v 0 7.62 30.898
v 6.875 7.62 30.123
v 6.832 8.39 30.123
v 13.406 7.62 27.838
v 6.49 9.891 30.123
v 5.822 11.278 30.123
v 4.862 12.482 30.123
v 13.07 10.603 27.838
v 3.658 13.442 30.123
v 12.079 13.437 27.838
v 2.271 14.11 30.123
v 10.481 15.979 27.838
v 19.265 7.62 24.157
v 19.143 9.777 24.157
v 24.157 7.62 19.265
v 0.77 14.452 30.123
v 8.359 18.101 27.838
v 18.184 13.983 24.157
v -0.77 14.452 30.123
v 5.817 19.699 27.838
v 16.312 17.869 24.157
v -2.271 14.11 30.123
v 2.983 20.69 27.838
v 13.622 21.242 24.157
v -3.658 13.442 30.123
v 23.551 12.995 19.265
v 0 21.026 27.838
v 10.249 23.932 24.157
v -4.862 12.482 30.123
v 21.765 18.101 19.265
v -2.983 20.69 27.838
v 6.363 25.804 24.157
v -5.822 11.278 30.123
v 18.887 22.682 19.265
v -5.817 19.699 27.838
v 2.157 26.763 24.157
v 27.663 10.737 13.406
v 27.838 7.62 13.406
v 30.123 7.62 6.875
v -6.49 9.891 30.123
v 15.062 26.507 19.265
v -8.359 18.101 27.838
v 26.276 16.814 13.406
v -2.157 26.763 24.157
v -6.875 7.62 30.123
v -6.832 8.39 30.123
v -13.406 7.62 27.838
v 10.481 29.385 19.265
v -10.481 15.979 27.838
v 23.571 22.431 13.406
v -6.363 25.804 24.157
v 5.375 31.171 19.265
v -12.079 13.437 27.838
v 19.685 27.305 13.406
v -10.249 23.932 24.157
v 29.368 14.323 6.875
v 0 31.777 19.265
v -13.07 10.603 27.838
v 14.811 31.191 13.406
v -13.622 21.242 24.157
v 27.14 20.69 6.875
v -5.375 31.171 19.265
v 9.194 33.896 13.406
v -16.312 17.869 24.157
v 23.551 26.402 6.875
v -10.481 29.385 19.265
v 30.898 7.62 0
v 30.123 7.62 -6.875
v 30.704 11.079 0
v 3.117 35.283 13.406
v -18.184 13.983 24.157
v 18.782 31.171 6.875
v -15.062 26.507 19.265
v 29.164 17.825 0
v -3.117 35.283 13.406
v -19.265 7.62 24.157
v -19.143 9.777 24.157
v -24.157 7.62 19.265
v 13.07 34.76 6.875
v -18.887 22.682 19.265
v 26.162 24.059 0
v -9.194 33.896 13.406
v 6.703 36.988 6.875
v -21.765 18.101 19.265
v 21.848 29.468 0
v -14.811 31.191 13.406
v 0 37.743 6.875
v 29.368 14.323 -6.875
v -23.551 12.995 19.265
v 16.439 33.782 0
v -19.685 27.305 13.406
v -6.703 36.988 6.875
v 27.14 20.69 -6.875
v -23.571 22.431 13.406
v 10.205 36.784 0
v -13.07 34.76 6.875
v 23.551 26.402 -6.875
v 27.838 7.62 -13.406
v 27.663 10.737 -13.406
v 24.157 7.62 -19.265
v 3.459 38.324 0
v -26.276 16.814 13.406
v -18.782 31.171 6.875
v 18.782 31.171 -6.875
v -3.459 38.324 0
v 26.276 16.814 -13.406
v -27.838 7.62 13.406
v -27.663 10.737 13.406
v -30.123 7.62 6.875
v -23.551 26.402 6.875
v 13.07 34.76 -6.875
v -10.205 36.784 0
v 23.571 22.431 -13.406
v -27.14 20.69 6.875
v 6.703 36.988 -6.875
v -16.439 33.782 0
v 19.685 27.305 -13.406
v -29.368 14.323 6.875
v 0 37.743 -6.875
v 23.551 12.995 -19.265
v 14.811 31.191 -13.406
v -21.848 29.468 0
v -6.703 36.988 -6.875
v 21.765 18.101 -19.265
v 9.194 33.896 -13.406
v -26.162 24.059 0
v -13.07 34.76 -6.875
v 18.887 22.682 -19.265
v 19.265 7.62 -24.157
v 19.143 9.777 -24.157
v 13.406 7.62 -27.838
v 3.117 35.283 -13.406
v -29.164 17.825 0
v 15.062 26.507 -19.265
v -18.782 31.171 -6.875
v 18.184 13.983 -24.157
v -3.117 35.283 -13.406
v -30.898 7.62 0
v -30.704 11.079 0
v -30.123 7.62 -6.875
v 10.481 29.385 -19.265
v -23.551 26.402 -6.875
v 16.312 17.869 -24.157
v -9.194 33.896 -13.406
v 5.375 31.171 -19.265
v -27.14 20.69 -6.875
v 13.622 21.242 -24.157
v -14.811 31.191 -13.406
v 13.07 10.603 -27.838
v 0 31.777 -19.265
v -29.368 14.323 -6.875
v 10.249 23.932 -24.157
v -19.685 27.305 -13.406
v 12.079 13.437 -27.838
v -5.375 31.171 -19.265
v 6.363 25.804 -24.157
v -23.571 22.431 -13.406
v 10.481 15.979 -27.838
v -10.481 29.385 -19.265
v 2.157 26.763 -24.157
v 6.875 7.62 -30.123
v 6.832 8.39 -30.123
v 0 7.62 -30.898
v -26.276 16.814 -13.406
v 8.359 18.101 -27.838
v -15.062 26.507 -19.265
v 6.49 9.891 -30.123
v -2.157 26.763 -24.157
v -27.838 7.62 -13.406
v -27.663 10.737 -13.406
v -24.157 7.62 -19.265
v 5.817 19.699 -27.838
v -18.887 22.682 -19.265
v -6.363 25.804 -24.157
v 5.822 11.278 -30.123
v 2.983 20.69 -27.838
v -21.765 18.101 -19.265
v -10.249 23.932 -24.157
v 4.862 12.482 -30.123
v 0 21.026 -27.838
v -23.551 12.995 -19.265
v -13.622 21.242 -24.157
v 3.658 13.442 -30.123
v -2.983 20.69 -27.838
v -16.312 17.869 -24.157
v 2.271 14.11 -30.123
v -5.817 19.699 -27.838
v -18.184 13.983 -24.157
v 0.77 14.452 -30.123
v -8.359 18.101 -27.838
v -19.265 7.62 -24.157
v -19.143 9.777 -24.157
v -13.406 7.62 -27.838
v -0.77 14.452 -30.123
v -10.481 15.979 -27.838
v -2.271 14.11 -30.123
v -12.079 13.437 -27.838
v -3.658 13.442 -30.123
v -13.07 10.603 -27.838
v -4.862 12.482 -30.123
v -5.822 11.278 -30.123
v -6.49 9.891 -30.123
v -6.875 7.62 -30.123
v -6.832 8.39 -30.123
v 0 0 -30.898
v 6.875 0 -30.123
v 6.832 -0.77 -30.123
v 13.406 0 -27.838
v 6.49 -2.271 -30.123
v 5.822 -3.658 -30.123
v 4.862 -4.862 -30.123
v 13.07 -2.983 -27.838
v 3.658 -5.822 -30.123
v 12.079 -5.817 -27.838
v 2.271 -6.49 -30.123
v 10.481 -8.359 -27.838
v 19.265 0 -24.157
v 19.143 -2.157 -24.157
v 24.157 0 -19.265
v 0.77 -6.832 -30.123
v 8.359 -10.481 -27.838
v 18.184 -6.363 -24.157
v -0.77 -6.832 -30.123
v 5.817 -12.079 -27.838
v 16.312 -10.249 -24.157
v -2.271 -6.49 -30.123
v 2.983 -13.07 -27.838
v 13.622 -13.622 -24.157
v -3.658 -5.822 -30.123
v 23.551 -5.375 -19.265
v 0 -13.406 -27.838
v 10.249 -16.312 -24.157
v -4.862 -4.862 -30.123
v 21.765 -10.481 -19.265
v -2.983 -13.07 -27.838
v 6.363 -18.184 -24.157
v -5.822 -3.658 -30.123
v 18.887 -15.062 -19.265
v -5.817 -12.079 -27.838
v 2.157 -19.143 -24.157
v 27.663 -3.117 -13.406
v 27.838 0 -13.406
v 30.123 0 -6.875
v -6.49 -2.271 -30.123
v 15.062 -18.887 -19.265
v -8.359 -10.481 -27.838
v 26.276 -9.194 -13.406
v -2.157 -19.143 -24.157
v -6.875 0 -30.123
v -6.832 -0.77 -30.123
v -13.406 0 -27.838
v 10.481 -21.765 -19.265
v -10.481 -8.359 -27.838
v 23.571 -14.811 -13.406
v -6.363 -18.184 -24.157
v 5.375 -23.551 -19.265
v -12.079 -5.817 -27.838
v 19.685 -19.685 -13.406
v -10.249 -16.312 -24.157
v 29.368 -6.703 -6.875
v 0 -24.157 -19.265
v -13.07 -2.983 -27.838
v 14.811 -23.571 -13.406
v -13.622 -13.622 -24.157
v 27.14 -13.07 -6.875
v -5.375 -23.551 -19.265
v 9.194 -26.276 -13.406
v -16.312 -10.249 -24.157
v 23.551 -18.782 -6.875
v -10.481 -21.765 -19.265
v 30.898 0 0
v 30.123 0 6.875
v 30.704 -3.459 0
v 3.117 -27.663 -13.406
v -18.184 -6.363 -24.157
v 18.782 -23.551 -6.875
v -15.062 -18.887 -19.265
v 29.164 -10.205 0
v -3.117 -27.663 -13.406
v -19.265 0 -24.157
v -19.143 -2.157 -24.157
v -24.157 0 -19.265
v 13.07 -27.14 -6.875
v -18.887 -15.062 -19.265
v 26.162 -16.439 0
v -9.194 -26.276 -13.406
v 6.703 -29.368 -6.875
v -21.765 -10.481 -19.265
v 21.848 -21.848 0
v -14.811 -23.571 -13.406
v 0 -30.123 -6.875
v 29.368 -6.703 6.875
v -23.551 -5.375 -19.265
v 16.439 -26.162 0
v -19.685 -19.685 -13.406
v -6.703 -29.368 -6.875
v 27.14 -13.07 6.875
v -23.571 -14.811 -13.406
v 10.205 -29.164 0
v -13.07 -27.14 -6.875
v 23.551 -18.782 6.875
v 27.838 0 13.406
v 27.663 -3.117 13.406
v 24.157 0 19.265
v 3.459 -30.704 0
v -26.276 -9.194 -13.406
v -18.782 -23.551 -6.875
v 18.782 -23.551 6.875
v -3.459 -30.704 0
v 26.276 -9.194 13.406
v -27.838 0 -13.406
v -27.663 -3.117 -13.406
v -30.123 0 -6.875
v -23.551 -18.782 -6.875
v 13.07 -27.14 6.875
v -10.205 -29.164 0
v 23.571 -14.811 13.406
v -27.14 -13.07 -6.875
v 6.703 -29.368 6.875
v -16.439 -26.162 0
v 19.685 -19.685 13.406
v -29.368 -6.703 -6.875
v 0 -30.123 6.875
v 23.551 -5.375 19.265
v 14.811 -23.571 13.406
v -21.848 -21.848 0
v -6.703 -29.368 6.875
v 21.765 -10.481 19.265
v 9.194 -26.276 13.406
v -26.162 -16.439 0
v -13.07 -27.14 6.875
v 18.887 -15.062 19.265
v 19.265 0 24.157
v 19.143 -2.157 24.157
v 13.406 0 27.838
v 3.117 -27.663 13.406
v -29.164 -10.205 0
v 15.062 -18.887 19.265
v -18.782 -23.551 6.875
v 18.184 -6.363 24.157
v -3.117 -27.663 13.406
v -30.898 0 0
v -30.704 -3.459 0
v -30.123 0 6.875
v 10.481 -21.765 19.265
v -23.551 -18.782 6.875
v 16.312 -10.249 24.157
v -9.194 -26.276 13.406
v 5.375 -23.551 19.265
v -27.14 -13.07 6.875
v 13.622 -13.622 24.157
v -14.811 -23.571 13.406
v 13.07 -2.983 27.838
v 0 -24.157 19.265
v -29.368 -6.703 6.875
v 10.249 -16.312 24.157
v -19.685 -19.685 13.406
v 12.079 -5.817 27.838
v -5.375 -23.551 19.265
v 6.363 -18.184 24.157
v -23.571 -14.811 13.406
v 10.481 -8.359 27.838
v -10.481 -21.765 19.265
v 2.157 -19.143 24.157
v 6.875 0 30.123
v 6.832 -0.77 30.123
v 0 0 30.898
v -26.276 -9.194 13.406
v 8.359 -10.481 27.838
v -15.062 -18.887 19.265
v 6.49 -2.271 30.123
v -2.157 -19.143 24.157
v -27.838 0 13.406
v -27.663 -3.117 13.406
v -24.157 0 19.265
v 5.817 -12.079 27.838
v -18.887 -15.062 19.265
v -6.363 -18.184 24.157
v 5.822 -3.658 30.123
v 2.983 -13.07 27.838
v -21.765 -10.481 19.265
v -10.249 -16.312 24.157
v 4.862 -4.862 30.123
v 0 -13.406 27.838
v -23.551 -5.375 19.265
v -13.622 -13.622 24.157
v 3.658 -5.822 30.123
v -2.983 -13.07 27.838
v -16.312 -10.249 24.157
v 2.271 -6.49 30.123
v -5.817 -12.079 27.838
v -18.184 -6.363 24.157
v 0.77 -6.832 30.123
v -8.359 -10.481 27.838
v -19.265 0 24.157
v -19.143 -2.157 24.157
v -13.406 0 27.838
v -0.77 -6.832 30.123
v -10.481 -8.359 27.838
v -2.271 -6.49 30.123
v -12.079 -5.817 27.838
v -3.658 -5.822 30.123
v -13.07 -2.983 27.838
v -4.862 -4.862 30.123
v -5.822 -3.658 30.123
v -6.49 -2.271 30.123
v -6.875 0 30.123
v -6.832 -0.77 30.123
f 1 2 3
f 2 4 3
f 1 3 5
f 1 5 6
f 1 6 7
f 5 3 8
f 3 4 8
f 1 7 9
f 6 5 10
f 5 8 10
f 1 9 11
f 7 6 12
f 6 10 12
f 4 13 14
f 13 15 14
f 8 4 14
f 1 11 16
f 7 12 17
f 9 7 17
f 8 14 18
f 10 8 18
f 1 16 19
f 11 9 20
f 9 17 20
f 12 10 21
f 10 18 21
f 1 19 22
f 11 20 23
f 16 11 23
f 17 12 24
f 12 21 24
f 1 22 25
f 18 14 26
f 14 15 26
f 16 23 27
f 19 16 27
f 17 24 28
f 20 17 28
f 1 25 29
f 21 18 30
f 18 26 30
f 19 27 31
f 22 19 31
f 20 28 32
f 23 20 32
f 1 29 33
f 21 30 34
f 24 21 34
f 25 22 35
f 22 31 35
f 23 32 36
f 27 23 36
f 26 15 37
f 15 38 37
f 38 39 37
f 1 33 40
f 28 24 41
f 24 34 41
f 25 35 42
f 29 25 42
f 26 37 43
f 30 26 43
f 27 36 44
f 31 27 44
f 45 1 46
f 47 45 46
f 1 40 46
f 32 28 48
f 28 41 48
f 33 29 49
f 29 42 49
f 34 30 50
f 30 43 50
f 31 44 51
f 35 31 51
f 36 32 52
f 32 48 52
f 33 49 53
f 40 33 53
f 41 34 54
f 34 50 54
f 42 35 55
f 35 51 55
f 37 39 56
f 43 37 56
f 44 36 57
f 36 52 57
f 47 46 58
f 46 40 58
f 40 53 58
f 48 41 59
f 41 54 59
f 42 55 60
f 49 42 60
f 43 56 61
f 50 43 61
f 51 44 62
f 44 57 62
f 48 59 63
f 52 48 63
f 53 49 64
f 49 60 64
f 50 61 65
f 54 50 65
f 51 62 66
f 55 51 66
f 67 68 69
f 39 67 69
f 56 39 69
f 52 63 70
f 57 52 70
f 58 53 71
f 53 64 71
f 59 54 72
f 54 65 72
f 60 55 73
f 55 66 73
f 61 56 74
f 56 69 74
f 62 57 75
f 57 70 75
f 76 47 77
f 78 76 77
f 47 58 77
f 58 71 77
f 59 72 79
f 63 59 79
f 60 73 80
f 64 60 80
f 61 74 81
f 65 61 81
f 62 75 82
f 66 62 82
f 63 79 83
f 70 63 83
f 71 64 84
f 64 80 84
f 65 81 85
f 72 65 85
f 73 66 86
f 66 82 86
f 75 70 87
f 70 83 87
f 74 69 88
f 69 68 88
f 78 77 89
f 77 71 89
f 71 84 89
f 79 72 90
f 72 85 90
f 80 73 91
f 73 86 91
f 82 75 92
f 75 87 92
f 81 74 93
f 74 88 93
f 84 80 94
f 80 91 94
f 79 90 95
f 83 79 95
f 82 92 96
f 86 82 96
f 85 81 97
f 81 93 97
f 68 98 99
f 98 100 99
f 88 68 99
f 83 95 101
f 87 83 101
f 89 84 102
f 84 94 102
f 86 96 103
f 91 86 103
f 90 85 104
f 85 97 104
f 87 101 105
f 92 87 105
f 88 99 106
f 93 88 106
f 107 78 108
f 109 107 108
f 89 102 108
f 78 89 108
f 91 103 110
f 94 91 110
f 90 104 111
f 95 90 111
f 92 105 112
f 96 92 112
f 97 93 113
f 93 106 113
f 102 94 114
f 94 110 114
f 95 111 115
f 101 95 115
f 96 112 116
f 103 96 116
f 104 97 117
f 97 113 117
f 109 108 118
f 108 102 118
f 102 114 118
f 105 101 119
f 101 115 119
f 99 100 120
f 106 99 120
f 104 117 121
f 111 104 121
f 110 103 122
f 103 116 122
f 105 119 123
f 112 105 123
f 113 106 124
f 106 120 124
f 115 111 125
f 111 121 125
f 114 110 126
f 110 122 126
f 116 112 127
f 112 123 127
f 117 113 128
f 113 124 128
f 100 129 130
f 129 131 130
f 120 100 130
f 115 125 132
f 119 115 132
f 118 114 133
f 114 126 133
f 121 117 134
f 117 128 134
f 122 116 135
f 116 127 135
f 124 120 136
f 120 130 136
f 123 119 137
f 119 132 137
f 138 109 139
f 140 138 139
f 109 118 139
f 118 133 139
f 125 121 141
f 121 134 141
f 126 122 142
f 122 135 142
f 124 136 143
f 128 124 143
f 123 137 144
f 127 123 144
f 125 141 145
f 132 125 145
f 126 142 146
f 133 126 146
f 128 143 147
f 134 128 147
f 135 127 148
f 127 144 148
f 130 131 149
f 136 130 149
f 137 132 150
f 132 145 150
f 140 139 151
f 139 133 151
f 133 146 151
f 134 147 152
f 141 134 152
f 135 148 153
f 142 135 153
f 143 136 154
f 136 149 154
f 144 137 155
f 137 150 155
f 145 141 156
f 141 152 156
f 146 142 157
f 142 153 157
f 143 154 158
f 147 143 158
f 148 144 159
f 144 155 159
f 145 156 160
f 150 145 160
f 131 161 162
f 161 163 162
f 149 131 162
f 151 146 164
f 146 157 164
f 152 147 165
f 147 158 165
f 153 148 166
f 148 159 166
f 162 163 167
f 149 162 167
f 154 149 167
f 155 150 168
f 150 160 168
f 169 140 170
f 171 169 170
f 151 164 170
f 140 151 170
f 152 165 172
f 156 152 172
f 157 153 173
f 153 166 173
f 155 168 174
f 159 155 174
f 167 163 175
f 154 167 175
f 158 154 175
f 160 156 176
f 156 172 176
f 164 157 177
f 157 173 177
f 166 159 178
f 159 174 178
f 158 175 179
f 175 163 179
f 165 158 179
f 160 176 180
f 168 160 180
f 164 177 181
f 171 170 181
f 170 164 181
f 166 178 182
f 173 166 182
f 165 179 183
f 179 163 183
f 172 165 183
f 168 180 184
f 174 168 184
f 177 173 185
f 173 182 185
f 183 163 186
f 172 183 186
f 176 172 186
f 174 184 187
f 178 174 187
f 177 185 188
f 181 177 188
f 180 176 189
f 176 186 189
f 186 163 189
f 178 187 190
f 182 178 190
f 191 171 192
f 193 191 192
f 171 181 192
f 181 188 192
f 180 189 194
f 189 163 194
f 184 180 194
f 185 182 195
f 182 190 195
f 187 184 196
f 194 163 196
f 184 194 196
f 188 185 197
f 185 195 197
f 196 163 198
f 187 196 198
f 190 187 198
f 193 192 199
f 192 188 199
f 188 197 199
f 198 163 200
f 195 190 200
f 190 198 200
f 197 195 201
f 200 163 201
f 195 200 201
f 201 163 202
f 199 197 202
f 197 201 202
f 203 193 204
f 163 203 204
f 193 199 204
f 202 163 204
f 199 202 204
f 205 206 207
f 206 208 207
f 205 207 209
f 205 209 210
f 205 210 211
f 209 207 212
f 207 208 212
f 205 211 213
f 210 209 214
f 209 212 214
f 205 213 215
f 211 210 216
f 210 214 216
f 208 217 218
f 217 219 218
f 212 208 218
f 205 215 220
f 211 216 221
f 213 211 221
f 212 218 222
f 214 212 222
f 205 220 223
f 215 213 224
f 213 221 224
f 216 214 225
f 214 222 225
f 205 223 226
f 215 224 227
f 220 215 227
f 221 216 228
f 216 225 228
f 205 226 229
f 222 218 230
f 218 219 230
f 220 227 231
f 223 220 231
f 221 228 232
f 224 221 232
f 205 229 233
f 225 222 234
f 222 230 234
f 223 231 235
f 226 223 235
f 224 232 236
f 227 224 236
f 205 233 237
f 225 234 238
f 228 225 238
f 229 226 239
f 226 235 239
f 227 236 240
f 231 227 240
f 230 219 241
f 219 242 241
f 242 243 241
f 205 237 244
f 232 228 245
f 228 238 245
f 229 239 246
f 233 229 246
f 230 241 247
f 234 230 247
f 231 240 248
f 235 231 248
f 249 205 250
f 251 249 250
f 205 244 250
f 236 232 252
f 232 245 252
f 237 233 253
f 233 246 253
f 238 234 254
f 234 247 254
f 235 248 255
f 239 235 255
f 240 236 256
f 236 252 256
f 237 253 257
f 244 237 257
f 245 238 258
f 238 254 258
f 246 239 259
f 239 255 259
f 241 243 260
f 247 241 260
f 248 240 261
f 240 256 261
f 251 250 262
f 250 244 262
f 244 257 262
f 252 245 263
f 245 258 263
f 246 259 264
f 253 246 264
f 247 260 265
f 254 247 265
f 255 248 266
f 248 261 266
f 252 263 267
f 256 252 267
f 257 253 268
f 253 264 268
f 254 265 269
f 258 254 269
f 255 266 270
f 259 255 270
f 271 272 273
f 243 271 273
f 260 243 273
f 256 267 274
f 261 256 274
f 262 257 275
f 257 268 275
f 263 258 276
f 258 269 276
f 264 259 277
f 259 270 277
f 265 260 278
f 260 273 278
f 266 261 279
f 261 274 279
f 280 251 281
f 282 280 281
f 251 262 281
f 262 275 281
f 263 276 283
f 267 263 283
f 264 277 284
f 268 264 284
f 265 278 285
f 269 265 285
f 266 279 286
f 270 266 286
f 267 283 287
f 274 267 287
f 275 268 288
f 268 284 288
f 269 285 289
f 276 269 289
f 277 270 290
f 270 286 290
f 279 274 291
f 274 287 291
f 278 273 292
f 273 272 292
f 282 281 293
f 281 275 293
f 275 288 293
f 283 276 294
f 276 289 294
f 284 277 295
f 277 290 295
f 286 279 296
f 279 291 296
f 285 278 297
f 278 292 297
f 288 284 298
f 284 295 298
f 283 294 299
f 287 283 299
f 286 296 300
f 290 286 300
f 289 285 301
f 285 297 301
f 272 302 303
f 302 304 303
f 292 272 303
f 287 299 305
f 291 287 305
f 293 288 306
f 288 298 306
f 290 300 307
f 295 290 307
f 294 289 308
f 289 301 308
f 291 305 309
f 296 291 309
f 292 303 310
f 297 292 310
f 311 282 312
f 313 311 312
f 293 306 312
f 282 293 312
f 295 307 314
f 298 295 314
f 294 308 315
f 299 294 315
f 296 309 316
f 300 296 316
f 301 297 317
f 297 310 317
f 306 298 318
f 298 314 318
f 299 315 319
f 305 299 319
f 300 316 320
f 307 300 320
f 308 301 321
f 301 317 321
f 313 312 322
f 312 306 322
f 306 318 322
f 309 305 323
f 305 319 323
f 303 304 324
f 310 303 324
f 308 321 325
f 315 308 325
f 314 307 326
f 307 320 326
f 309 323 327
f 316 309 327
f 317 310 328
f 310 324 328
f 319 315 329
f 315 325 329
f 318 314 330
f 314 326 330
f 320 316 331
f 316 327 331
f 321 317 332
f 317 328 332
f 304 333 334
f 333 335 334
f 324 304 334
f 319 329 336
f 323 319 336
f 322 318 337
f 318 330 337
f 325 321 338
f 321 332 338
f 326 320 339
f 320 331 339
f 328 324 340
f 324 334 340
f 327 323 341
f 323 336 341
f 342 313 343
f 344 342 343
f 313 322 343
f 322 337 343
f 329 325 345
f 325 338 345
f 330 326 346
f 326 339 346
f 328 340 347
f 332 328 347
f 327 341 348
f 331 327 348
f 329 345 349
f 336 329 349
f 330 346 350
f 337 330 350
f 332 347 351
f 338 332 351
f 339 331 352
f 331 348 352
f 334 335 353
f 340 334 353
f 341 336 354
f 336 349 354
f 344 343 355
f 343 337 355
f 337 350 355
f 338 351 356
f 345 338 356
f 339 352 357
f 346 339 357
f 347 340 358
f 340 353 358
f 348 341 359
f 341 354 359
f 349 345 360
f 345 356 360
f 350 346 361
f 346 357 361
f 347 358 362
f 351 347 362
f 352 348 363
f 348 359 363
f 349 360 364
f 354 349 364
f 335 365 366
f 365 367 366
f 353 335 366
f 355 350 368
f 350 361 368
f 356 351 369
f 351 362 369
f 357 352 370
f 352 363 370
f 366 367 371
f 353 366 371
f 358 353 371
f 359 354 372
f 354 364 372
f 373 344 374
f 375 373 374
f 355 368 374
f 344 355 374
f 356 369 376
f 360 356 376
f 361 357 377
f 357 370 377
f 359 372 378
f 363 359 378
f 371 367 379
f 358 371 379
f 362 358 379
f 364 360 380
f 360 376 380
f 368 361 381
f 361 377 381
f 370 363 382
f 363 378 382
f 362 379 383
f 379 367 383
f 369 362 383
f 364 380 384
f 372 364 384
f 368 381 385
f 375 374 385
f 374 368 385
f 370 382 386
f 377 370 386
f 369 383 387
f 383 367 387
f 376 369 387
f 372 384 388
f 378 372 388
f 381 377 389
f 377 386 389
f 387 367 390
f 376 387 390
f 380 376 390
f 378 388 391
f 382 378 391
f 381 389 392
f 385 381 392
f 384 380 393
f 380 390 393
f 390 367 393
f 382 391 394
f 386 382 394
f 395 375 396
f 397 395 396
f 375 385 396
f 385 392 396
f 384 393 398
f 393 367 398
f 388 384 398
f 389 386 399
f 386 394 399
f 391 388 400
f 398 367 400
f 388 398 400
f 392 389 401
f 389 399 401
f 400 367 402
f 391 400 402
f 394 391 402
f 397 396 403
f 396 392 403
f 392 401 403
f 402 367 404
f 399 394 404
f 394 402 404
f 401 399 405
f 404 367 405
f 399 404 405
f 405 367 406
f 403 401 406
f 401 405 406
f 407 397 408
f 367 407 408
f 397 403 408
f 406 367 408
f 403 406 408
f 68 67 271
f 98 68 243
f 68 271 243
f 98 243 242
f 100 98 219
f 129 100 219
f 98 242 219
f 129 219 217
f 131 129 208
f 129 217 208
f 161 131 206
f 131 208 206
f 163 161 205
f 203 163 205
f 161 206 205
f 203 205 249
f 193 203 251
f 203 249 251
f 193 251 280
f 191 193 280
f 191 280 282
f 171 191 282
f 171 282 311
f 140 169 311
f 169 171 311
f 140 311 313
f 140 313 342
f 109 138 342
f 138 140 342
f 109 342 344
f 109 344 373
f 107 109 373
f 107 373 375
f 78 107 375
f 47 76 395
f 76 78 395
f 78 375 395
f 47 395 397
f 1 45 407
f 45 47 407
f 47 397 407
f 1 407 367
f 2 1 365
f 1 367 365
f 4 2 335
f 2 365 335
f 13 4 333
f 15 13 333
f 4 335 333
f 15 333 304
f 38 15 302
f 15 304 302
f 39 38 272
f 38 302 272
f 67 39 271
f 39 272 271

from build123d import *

# Parameters (mm, degrees)
REVOLVE1_ANGLE      = 180
SKETCH2_R           = 30.897972145
BOSS_EXTRUDE1_DEPTH = 7.62
REVOLVE2_ANGLE      = 180


with BuildPart() as part:
    # Sketch1 → Revolve1 (revolve)
    with BuildSketch(Plane(origin=(0, 0, 0), x_dir=(1, 0, 0), z_dir=(0, 1, 0))):
        with BuildLine():
            Line((0, -30.897972145), (0, 30.897972145))
            ThreePointArc((0, 30.897972145), (30.897972145, 0), (0, -30.897972145))
        make_face()
    revolve(axis=Axis((0, 0, 30.897972145), (0, 0, -1)), revolution_arc=REVOLVE1_ANGLE)

    # Sketch2 → Boss-Extrude1 (add)
    with BuildSketch(Plane(origin=(0, 0, 0), x_dir=(1, 0, 0), z_dir=(0, 1, 0))):
        Circle(SKETCH2_R)
    extrude(amount=BOSS_EXTRUDE1_DEPTH)

    # Sketch3 → Revolve2 (revolve)
    with BuildSketch(Plane(origin=(0, 7.62, 0), x_dir=(1, 0, 0), z_dir=(0, 1, 0))):
        with BuildLine():
            Line((0, 30.897972145), (0, -30.897972145))
            ThreePointArc((0, -30.897972145), (30.897972145, 0), (0, 30.897972145))
        make_face()
    revolve(axis=Axis((0, 7.62, -30.897972145), (0, 0, 1)), revolution_arc=REVOLVE2_ANGLE)


solid = part.part
